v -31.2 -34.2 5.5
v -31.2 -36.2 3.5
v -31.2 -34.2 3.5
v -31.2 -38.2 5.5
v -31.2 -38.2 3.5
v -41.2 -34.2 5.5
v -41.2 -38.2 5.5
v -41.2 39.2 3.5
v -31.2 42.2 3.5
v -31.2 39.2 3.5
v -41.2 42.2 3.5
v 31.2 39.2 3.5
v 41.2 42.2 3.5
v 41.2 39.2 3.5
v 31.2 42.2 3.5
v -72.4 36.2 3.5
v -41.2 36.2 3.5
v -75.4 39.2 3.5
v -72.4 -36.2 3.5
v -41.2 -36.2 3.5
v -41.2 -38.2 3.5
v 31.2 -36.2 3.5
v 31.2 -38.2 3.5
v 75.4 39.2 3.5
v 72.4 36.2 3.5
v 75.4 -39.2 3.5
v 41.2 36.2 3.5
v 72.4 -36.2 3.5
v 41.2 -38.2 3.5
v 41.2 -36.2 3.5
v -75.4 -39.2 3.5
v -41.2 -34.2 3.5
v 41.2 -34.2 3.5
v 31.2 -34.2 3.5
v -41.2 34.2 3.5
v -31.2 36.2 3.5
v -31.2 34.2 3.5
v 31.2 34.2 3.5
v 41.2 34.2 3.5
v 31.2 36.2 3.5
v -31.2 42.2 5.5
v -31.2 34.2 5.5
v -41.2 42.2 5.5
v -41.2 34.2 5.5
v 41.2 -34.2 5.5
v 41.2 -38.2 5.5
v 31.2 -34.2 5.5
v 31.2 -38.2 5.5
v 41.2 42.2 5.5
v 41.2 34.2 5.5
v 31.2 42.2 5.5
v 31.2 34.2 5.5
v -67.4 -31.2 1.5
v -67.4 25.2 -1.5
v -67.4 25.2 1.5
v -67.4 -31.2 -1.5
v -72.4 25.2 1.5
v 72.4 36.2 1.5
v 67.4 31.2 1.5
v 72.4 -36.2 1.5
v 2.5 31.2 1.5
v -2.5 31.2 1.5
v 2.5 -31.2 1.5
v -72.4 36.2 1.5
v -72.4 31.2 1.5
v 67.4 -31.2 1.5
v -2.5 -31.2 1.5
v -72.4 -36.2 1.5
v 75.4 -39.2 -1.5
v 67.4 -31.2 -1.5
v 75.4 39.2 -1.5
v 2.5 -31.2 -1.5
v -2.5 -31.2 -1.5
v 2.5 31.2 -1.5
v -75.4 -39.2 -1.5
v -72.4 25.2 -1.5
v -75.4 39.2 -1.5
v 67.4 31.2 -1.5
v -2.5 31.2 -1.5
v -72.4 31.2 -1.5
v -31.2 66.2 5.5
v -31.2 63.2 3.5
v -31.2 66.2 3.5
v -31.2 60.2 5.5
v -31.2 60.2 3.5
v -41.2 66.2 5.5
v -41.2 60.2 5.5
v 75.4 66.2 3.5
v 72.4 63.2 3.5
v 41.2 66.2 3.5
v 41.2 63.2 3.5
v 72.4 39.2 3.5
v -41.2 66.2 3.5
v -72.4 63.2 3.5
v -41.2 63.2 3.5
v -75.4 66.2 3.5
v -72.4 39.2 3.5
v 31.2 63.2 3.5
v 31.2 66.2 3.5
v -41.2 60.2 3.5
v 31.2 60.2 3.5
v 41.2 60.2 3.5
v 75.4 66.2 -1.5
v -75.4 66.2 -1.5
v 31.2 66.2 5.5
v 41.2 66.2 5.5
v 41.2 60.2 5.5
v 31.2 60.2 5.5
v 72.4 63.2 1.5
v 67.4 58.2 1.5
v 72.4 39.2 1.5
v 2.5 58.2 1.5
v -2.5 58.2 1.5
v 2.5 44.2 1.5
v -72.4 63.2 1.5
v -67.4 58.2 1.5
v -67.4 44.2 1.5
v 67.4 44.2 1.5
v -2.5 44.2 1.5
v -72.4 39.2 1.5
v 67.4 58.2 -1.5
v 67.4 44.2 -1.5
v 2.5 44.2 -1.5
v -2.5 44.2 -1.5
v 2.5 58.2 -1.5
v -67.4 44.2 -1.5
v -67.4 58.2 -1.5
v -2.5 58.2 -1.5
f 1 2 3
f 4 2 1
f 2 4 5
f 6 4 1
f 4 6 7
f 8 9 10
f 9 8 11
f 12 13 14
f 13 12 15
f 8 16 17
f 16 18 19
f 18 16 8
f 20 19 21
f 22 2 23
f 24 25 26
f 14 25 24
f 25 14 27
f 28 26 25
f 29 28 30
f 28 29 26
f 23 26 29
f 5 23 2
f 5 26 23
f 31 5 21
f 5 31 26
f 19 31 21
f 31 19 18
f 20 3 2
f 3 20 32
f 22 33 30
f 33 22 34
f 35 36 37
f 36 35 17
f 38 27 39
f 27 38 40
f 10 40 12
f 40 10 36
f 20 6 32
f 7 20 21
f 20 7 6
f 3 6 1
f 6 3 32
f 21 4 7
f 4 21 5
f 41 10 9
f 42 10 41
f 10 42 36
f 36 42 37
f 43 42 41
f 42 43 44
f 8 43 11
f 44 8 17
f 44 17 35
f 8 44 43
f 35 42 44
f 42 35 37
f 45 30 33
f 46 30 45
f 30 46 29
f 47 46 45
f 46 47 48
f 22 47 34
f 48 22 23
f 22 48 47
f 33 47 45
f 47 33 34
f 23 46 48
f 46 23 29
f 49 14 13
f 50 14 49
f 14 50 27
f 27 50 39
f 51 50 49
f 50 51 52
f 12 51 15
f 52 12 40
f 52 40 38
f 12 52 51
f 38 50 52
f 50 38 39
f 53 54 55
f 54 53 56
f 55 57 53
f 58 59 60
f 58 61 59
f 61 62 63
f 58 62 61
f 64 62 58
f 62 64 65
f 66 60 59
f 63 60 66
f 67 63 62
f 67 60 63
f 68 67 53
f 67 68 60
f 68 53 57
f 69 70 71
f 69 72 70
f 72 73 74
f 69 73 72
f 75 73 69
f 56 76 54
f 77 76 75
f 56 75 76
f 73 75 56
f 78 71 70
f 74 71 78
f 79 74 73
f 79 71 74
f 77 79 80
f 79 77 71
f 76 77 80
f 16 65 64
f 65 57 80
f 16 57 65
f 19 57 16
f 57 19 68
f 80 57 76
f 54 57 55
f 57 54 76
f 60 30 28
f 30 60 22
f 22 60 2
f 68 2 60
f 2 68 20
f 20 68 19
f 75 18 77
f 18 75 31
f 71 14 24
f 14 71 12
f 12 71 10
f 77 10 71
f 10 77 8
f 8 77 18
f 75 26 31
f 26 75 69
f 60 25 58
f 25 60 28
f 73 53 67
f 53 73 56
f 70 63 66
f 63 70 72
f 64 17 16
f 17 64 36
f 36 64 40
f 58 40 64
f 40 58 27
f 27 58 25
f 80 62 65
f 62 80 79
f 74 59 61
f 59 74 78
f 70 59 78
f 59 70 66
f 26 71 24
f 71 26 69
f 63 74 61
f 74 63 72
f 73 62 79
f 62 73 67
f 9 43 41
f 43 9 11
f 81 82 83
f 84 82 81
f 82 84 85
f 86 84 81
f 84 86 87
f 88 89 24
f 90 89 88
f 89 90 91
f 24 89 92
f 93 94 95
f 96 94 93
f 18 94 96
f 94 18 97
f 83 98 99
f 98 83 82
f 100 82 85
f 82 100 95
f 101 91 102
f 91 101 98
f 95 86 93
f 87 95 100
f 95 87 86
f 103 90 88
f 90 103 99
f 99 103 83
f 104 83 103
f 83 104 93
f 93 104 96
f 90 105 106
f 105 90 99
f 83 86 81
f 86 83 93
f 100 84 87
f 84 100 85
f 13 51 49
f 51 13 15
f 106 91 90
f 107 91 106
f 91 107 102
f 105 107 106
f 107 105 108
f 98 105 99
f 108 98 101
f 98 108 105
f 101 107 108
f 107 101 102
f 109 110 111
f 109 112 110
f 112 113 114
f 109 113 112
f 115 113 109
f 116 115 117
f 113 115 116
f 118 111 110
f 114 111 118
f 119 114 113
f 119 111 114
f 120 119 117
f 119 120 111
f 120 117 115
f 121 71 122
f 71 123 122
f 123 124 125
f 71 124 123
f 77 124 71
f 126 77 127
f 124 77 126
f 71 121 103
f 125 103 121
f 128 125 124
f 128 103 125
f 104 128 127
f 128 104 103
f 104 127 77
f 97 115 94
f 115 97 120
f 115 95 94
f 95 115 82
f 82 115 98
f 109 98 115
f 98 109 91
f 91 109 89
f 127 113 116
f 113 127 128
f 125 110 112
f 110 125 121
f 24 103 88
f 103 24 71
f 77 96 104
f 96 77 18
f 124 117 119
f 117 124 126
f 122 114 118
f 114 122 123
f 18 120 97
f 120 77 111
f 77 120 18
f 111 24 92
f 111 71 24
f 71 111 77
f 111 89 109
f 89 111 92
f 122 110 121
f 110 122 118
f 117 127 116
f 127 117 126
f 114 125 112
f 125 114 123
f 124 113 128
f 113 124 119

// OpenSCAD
// file: legendMount-v1.scad
module legendMount(buildCount) {

    unitLength = 72.4;
	unitWidth = 72.4;
	length = unitLength * buildCount;
	width = 24;
	depth = 3;
	mountWidth = 5;

	translate([0, (width / 2) - (mountWidth / 2), 0])
      cube([length, mountWidth, depth], center=true);
	translate([0, (width / 2) + (depth / 2), (mountWidth - depth) / 2])
	  cube([length + (depth * 2), depth, mountWidth], center=true);

	translate([0, - (width / 2) + (mountWidth / 2), 0])
      cube([length, mountWidth, depth], center=true);

	translate([(length / 2) - (mountWidth / 2), 0, 0]) 
	  cube([mountWidth, width, depth], center=true);
	translate([(length / 2) + (depth / 2), 0, (mountWidth - depth) / 2]) 
	  cube([depth, width, mountWidth], center=true);

	translate([- (length / 2) + (mountWidth / 2), 0, 0]) 
	  cube([mountWidth, width, depth], center=true);
	translate([- (length / 2) -  + (depth / 2), 0, (mountWidth - depth) / 2]) 
	  cube([depth, width, mountWidth], center=true);

	for (panelNo = [ 0 : buildCount - 1 ]) {
		translate([((panelNo + 0.5) * unitLength) - (length / 2), - width / 2, mountWidth - 0.5])
		  cube([10, 6, 2], center=true);
		translate([((panelNo + 0.5) * unitLength) - (length / 2), width / 2, mountWidth - 0.5])
		  cube([10, 6, 2], center=true);
	}

	if (buildCount > 1) {
		for (panelNo = [ 1 : buildCount - 1 ]) {
			translate([((panelNo - 1) * unitLength) , 0, 0])
			  cube([mountWidth, width, depth], center=true);
		}
	}

}
// file: neoMatrixMount-v1.scad
module neoMatrixMount(sizeX, sizeY) {

    unitLength = 72.4;
	unitWidth = 72.4;
	length = unitLength * sizeX;
	width = unitWidth * sizeY;
	depth = 3;
	mountWidth = 5;

	translate([ - length / 2 + mountWidth / 2, - 5.5, 0]) 
	  cube([mountWidth, width - 11, depth], center=true);
	translate([ - length / 2 - depth / 2, 0, (mountWidth - depth) / 2]) 
	  cube([depth, width + (depth * 2), mountWidth], center=true);

	translate([0, - width / 2 + (mountWidth / 2), 0]) 
	  cube([length, mountWidth, depth], center=true);
	translate([0, - width / 2 - depth / 2, (mountWidth - depth) / 2]) 
	  cube([length, depth, mountWidth], center=true);

	translate([0, width / 2 - (mountWidth / 2), 0]) 
	  cube([length, mountWidth, depth], center=true);
	translate([0, width / 2 + depth / 2, (mountWidth - depth) / 2]) 
	  cube([length, depth, mountWidth], center=true);

	translate([ length / 2 - mountWidth / 2, 0, 0]) 
	  cube([mountWidth, width, depth], center=true);
	translate([ length / 2 + depth / 2, 0, (mountWidth - depth) / 2]) 
	  cube([depth, width + (depth * 2), mountWidth], center=true);


	for (panelNo = [ 0 : sizeX - 1 ]) {
		translate([ (((panelNo + 1) * unitLength) - (unitLength / 2)) - (length / 2), - width / 2, mountWidth - 0.5])
		  cube([10, 4, 2], center=true);
		translate([ (((panelNo + 1) * unitLength) - (unitLength / 2)) - (length / 2), width / 2, mountWidth - 0.5])
		  cube([10, 4, 2], center=true);
	}



	if (sizeX > 1) {
		for (panelNo = [ 1 : sizeX - 1 ]) {
			translate([((panelNo - 1) * unitLength) , 0, 0])
			  cube([mountWidth, width, depth], center=true);
		}
	}

}
// main file
use <neoMatrixMount-v1.scad>
use <legendMount-v1.scad>

module buildMonitorDisplay(buildCount) {

	neoMatrixMount(buildCount, 1);
	translate([0, 36.2 + 3 + 12, 0]) legendMount(buildCount);

}

buildMonitorDisplay(2);
